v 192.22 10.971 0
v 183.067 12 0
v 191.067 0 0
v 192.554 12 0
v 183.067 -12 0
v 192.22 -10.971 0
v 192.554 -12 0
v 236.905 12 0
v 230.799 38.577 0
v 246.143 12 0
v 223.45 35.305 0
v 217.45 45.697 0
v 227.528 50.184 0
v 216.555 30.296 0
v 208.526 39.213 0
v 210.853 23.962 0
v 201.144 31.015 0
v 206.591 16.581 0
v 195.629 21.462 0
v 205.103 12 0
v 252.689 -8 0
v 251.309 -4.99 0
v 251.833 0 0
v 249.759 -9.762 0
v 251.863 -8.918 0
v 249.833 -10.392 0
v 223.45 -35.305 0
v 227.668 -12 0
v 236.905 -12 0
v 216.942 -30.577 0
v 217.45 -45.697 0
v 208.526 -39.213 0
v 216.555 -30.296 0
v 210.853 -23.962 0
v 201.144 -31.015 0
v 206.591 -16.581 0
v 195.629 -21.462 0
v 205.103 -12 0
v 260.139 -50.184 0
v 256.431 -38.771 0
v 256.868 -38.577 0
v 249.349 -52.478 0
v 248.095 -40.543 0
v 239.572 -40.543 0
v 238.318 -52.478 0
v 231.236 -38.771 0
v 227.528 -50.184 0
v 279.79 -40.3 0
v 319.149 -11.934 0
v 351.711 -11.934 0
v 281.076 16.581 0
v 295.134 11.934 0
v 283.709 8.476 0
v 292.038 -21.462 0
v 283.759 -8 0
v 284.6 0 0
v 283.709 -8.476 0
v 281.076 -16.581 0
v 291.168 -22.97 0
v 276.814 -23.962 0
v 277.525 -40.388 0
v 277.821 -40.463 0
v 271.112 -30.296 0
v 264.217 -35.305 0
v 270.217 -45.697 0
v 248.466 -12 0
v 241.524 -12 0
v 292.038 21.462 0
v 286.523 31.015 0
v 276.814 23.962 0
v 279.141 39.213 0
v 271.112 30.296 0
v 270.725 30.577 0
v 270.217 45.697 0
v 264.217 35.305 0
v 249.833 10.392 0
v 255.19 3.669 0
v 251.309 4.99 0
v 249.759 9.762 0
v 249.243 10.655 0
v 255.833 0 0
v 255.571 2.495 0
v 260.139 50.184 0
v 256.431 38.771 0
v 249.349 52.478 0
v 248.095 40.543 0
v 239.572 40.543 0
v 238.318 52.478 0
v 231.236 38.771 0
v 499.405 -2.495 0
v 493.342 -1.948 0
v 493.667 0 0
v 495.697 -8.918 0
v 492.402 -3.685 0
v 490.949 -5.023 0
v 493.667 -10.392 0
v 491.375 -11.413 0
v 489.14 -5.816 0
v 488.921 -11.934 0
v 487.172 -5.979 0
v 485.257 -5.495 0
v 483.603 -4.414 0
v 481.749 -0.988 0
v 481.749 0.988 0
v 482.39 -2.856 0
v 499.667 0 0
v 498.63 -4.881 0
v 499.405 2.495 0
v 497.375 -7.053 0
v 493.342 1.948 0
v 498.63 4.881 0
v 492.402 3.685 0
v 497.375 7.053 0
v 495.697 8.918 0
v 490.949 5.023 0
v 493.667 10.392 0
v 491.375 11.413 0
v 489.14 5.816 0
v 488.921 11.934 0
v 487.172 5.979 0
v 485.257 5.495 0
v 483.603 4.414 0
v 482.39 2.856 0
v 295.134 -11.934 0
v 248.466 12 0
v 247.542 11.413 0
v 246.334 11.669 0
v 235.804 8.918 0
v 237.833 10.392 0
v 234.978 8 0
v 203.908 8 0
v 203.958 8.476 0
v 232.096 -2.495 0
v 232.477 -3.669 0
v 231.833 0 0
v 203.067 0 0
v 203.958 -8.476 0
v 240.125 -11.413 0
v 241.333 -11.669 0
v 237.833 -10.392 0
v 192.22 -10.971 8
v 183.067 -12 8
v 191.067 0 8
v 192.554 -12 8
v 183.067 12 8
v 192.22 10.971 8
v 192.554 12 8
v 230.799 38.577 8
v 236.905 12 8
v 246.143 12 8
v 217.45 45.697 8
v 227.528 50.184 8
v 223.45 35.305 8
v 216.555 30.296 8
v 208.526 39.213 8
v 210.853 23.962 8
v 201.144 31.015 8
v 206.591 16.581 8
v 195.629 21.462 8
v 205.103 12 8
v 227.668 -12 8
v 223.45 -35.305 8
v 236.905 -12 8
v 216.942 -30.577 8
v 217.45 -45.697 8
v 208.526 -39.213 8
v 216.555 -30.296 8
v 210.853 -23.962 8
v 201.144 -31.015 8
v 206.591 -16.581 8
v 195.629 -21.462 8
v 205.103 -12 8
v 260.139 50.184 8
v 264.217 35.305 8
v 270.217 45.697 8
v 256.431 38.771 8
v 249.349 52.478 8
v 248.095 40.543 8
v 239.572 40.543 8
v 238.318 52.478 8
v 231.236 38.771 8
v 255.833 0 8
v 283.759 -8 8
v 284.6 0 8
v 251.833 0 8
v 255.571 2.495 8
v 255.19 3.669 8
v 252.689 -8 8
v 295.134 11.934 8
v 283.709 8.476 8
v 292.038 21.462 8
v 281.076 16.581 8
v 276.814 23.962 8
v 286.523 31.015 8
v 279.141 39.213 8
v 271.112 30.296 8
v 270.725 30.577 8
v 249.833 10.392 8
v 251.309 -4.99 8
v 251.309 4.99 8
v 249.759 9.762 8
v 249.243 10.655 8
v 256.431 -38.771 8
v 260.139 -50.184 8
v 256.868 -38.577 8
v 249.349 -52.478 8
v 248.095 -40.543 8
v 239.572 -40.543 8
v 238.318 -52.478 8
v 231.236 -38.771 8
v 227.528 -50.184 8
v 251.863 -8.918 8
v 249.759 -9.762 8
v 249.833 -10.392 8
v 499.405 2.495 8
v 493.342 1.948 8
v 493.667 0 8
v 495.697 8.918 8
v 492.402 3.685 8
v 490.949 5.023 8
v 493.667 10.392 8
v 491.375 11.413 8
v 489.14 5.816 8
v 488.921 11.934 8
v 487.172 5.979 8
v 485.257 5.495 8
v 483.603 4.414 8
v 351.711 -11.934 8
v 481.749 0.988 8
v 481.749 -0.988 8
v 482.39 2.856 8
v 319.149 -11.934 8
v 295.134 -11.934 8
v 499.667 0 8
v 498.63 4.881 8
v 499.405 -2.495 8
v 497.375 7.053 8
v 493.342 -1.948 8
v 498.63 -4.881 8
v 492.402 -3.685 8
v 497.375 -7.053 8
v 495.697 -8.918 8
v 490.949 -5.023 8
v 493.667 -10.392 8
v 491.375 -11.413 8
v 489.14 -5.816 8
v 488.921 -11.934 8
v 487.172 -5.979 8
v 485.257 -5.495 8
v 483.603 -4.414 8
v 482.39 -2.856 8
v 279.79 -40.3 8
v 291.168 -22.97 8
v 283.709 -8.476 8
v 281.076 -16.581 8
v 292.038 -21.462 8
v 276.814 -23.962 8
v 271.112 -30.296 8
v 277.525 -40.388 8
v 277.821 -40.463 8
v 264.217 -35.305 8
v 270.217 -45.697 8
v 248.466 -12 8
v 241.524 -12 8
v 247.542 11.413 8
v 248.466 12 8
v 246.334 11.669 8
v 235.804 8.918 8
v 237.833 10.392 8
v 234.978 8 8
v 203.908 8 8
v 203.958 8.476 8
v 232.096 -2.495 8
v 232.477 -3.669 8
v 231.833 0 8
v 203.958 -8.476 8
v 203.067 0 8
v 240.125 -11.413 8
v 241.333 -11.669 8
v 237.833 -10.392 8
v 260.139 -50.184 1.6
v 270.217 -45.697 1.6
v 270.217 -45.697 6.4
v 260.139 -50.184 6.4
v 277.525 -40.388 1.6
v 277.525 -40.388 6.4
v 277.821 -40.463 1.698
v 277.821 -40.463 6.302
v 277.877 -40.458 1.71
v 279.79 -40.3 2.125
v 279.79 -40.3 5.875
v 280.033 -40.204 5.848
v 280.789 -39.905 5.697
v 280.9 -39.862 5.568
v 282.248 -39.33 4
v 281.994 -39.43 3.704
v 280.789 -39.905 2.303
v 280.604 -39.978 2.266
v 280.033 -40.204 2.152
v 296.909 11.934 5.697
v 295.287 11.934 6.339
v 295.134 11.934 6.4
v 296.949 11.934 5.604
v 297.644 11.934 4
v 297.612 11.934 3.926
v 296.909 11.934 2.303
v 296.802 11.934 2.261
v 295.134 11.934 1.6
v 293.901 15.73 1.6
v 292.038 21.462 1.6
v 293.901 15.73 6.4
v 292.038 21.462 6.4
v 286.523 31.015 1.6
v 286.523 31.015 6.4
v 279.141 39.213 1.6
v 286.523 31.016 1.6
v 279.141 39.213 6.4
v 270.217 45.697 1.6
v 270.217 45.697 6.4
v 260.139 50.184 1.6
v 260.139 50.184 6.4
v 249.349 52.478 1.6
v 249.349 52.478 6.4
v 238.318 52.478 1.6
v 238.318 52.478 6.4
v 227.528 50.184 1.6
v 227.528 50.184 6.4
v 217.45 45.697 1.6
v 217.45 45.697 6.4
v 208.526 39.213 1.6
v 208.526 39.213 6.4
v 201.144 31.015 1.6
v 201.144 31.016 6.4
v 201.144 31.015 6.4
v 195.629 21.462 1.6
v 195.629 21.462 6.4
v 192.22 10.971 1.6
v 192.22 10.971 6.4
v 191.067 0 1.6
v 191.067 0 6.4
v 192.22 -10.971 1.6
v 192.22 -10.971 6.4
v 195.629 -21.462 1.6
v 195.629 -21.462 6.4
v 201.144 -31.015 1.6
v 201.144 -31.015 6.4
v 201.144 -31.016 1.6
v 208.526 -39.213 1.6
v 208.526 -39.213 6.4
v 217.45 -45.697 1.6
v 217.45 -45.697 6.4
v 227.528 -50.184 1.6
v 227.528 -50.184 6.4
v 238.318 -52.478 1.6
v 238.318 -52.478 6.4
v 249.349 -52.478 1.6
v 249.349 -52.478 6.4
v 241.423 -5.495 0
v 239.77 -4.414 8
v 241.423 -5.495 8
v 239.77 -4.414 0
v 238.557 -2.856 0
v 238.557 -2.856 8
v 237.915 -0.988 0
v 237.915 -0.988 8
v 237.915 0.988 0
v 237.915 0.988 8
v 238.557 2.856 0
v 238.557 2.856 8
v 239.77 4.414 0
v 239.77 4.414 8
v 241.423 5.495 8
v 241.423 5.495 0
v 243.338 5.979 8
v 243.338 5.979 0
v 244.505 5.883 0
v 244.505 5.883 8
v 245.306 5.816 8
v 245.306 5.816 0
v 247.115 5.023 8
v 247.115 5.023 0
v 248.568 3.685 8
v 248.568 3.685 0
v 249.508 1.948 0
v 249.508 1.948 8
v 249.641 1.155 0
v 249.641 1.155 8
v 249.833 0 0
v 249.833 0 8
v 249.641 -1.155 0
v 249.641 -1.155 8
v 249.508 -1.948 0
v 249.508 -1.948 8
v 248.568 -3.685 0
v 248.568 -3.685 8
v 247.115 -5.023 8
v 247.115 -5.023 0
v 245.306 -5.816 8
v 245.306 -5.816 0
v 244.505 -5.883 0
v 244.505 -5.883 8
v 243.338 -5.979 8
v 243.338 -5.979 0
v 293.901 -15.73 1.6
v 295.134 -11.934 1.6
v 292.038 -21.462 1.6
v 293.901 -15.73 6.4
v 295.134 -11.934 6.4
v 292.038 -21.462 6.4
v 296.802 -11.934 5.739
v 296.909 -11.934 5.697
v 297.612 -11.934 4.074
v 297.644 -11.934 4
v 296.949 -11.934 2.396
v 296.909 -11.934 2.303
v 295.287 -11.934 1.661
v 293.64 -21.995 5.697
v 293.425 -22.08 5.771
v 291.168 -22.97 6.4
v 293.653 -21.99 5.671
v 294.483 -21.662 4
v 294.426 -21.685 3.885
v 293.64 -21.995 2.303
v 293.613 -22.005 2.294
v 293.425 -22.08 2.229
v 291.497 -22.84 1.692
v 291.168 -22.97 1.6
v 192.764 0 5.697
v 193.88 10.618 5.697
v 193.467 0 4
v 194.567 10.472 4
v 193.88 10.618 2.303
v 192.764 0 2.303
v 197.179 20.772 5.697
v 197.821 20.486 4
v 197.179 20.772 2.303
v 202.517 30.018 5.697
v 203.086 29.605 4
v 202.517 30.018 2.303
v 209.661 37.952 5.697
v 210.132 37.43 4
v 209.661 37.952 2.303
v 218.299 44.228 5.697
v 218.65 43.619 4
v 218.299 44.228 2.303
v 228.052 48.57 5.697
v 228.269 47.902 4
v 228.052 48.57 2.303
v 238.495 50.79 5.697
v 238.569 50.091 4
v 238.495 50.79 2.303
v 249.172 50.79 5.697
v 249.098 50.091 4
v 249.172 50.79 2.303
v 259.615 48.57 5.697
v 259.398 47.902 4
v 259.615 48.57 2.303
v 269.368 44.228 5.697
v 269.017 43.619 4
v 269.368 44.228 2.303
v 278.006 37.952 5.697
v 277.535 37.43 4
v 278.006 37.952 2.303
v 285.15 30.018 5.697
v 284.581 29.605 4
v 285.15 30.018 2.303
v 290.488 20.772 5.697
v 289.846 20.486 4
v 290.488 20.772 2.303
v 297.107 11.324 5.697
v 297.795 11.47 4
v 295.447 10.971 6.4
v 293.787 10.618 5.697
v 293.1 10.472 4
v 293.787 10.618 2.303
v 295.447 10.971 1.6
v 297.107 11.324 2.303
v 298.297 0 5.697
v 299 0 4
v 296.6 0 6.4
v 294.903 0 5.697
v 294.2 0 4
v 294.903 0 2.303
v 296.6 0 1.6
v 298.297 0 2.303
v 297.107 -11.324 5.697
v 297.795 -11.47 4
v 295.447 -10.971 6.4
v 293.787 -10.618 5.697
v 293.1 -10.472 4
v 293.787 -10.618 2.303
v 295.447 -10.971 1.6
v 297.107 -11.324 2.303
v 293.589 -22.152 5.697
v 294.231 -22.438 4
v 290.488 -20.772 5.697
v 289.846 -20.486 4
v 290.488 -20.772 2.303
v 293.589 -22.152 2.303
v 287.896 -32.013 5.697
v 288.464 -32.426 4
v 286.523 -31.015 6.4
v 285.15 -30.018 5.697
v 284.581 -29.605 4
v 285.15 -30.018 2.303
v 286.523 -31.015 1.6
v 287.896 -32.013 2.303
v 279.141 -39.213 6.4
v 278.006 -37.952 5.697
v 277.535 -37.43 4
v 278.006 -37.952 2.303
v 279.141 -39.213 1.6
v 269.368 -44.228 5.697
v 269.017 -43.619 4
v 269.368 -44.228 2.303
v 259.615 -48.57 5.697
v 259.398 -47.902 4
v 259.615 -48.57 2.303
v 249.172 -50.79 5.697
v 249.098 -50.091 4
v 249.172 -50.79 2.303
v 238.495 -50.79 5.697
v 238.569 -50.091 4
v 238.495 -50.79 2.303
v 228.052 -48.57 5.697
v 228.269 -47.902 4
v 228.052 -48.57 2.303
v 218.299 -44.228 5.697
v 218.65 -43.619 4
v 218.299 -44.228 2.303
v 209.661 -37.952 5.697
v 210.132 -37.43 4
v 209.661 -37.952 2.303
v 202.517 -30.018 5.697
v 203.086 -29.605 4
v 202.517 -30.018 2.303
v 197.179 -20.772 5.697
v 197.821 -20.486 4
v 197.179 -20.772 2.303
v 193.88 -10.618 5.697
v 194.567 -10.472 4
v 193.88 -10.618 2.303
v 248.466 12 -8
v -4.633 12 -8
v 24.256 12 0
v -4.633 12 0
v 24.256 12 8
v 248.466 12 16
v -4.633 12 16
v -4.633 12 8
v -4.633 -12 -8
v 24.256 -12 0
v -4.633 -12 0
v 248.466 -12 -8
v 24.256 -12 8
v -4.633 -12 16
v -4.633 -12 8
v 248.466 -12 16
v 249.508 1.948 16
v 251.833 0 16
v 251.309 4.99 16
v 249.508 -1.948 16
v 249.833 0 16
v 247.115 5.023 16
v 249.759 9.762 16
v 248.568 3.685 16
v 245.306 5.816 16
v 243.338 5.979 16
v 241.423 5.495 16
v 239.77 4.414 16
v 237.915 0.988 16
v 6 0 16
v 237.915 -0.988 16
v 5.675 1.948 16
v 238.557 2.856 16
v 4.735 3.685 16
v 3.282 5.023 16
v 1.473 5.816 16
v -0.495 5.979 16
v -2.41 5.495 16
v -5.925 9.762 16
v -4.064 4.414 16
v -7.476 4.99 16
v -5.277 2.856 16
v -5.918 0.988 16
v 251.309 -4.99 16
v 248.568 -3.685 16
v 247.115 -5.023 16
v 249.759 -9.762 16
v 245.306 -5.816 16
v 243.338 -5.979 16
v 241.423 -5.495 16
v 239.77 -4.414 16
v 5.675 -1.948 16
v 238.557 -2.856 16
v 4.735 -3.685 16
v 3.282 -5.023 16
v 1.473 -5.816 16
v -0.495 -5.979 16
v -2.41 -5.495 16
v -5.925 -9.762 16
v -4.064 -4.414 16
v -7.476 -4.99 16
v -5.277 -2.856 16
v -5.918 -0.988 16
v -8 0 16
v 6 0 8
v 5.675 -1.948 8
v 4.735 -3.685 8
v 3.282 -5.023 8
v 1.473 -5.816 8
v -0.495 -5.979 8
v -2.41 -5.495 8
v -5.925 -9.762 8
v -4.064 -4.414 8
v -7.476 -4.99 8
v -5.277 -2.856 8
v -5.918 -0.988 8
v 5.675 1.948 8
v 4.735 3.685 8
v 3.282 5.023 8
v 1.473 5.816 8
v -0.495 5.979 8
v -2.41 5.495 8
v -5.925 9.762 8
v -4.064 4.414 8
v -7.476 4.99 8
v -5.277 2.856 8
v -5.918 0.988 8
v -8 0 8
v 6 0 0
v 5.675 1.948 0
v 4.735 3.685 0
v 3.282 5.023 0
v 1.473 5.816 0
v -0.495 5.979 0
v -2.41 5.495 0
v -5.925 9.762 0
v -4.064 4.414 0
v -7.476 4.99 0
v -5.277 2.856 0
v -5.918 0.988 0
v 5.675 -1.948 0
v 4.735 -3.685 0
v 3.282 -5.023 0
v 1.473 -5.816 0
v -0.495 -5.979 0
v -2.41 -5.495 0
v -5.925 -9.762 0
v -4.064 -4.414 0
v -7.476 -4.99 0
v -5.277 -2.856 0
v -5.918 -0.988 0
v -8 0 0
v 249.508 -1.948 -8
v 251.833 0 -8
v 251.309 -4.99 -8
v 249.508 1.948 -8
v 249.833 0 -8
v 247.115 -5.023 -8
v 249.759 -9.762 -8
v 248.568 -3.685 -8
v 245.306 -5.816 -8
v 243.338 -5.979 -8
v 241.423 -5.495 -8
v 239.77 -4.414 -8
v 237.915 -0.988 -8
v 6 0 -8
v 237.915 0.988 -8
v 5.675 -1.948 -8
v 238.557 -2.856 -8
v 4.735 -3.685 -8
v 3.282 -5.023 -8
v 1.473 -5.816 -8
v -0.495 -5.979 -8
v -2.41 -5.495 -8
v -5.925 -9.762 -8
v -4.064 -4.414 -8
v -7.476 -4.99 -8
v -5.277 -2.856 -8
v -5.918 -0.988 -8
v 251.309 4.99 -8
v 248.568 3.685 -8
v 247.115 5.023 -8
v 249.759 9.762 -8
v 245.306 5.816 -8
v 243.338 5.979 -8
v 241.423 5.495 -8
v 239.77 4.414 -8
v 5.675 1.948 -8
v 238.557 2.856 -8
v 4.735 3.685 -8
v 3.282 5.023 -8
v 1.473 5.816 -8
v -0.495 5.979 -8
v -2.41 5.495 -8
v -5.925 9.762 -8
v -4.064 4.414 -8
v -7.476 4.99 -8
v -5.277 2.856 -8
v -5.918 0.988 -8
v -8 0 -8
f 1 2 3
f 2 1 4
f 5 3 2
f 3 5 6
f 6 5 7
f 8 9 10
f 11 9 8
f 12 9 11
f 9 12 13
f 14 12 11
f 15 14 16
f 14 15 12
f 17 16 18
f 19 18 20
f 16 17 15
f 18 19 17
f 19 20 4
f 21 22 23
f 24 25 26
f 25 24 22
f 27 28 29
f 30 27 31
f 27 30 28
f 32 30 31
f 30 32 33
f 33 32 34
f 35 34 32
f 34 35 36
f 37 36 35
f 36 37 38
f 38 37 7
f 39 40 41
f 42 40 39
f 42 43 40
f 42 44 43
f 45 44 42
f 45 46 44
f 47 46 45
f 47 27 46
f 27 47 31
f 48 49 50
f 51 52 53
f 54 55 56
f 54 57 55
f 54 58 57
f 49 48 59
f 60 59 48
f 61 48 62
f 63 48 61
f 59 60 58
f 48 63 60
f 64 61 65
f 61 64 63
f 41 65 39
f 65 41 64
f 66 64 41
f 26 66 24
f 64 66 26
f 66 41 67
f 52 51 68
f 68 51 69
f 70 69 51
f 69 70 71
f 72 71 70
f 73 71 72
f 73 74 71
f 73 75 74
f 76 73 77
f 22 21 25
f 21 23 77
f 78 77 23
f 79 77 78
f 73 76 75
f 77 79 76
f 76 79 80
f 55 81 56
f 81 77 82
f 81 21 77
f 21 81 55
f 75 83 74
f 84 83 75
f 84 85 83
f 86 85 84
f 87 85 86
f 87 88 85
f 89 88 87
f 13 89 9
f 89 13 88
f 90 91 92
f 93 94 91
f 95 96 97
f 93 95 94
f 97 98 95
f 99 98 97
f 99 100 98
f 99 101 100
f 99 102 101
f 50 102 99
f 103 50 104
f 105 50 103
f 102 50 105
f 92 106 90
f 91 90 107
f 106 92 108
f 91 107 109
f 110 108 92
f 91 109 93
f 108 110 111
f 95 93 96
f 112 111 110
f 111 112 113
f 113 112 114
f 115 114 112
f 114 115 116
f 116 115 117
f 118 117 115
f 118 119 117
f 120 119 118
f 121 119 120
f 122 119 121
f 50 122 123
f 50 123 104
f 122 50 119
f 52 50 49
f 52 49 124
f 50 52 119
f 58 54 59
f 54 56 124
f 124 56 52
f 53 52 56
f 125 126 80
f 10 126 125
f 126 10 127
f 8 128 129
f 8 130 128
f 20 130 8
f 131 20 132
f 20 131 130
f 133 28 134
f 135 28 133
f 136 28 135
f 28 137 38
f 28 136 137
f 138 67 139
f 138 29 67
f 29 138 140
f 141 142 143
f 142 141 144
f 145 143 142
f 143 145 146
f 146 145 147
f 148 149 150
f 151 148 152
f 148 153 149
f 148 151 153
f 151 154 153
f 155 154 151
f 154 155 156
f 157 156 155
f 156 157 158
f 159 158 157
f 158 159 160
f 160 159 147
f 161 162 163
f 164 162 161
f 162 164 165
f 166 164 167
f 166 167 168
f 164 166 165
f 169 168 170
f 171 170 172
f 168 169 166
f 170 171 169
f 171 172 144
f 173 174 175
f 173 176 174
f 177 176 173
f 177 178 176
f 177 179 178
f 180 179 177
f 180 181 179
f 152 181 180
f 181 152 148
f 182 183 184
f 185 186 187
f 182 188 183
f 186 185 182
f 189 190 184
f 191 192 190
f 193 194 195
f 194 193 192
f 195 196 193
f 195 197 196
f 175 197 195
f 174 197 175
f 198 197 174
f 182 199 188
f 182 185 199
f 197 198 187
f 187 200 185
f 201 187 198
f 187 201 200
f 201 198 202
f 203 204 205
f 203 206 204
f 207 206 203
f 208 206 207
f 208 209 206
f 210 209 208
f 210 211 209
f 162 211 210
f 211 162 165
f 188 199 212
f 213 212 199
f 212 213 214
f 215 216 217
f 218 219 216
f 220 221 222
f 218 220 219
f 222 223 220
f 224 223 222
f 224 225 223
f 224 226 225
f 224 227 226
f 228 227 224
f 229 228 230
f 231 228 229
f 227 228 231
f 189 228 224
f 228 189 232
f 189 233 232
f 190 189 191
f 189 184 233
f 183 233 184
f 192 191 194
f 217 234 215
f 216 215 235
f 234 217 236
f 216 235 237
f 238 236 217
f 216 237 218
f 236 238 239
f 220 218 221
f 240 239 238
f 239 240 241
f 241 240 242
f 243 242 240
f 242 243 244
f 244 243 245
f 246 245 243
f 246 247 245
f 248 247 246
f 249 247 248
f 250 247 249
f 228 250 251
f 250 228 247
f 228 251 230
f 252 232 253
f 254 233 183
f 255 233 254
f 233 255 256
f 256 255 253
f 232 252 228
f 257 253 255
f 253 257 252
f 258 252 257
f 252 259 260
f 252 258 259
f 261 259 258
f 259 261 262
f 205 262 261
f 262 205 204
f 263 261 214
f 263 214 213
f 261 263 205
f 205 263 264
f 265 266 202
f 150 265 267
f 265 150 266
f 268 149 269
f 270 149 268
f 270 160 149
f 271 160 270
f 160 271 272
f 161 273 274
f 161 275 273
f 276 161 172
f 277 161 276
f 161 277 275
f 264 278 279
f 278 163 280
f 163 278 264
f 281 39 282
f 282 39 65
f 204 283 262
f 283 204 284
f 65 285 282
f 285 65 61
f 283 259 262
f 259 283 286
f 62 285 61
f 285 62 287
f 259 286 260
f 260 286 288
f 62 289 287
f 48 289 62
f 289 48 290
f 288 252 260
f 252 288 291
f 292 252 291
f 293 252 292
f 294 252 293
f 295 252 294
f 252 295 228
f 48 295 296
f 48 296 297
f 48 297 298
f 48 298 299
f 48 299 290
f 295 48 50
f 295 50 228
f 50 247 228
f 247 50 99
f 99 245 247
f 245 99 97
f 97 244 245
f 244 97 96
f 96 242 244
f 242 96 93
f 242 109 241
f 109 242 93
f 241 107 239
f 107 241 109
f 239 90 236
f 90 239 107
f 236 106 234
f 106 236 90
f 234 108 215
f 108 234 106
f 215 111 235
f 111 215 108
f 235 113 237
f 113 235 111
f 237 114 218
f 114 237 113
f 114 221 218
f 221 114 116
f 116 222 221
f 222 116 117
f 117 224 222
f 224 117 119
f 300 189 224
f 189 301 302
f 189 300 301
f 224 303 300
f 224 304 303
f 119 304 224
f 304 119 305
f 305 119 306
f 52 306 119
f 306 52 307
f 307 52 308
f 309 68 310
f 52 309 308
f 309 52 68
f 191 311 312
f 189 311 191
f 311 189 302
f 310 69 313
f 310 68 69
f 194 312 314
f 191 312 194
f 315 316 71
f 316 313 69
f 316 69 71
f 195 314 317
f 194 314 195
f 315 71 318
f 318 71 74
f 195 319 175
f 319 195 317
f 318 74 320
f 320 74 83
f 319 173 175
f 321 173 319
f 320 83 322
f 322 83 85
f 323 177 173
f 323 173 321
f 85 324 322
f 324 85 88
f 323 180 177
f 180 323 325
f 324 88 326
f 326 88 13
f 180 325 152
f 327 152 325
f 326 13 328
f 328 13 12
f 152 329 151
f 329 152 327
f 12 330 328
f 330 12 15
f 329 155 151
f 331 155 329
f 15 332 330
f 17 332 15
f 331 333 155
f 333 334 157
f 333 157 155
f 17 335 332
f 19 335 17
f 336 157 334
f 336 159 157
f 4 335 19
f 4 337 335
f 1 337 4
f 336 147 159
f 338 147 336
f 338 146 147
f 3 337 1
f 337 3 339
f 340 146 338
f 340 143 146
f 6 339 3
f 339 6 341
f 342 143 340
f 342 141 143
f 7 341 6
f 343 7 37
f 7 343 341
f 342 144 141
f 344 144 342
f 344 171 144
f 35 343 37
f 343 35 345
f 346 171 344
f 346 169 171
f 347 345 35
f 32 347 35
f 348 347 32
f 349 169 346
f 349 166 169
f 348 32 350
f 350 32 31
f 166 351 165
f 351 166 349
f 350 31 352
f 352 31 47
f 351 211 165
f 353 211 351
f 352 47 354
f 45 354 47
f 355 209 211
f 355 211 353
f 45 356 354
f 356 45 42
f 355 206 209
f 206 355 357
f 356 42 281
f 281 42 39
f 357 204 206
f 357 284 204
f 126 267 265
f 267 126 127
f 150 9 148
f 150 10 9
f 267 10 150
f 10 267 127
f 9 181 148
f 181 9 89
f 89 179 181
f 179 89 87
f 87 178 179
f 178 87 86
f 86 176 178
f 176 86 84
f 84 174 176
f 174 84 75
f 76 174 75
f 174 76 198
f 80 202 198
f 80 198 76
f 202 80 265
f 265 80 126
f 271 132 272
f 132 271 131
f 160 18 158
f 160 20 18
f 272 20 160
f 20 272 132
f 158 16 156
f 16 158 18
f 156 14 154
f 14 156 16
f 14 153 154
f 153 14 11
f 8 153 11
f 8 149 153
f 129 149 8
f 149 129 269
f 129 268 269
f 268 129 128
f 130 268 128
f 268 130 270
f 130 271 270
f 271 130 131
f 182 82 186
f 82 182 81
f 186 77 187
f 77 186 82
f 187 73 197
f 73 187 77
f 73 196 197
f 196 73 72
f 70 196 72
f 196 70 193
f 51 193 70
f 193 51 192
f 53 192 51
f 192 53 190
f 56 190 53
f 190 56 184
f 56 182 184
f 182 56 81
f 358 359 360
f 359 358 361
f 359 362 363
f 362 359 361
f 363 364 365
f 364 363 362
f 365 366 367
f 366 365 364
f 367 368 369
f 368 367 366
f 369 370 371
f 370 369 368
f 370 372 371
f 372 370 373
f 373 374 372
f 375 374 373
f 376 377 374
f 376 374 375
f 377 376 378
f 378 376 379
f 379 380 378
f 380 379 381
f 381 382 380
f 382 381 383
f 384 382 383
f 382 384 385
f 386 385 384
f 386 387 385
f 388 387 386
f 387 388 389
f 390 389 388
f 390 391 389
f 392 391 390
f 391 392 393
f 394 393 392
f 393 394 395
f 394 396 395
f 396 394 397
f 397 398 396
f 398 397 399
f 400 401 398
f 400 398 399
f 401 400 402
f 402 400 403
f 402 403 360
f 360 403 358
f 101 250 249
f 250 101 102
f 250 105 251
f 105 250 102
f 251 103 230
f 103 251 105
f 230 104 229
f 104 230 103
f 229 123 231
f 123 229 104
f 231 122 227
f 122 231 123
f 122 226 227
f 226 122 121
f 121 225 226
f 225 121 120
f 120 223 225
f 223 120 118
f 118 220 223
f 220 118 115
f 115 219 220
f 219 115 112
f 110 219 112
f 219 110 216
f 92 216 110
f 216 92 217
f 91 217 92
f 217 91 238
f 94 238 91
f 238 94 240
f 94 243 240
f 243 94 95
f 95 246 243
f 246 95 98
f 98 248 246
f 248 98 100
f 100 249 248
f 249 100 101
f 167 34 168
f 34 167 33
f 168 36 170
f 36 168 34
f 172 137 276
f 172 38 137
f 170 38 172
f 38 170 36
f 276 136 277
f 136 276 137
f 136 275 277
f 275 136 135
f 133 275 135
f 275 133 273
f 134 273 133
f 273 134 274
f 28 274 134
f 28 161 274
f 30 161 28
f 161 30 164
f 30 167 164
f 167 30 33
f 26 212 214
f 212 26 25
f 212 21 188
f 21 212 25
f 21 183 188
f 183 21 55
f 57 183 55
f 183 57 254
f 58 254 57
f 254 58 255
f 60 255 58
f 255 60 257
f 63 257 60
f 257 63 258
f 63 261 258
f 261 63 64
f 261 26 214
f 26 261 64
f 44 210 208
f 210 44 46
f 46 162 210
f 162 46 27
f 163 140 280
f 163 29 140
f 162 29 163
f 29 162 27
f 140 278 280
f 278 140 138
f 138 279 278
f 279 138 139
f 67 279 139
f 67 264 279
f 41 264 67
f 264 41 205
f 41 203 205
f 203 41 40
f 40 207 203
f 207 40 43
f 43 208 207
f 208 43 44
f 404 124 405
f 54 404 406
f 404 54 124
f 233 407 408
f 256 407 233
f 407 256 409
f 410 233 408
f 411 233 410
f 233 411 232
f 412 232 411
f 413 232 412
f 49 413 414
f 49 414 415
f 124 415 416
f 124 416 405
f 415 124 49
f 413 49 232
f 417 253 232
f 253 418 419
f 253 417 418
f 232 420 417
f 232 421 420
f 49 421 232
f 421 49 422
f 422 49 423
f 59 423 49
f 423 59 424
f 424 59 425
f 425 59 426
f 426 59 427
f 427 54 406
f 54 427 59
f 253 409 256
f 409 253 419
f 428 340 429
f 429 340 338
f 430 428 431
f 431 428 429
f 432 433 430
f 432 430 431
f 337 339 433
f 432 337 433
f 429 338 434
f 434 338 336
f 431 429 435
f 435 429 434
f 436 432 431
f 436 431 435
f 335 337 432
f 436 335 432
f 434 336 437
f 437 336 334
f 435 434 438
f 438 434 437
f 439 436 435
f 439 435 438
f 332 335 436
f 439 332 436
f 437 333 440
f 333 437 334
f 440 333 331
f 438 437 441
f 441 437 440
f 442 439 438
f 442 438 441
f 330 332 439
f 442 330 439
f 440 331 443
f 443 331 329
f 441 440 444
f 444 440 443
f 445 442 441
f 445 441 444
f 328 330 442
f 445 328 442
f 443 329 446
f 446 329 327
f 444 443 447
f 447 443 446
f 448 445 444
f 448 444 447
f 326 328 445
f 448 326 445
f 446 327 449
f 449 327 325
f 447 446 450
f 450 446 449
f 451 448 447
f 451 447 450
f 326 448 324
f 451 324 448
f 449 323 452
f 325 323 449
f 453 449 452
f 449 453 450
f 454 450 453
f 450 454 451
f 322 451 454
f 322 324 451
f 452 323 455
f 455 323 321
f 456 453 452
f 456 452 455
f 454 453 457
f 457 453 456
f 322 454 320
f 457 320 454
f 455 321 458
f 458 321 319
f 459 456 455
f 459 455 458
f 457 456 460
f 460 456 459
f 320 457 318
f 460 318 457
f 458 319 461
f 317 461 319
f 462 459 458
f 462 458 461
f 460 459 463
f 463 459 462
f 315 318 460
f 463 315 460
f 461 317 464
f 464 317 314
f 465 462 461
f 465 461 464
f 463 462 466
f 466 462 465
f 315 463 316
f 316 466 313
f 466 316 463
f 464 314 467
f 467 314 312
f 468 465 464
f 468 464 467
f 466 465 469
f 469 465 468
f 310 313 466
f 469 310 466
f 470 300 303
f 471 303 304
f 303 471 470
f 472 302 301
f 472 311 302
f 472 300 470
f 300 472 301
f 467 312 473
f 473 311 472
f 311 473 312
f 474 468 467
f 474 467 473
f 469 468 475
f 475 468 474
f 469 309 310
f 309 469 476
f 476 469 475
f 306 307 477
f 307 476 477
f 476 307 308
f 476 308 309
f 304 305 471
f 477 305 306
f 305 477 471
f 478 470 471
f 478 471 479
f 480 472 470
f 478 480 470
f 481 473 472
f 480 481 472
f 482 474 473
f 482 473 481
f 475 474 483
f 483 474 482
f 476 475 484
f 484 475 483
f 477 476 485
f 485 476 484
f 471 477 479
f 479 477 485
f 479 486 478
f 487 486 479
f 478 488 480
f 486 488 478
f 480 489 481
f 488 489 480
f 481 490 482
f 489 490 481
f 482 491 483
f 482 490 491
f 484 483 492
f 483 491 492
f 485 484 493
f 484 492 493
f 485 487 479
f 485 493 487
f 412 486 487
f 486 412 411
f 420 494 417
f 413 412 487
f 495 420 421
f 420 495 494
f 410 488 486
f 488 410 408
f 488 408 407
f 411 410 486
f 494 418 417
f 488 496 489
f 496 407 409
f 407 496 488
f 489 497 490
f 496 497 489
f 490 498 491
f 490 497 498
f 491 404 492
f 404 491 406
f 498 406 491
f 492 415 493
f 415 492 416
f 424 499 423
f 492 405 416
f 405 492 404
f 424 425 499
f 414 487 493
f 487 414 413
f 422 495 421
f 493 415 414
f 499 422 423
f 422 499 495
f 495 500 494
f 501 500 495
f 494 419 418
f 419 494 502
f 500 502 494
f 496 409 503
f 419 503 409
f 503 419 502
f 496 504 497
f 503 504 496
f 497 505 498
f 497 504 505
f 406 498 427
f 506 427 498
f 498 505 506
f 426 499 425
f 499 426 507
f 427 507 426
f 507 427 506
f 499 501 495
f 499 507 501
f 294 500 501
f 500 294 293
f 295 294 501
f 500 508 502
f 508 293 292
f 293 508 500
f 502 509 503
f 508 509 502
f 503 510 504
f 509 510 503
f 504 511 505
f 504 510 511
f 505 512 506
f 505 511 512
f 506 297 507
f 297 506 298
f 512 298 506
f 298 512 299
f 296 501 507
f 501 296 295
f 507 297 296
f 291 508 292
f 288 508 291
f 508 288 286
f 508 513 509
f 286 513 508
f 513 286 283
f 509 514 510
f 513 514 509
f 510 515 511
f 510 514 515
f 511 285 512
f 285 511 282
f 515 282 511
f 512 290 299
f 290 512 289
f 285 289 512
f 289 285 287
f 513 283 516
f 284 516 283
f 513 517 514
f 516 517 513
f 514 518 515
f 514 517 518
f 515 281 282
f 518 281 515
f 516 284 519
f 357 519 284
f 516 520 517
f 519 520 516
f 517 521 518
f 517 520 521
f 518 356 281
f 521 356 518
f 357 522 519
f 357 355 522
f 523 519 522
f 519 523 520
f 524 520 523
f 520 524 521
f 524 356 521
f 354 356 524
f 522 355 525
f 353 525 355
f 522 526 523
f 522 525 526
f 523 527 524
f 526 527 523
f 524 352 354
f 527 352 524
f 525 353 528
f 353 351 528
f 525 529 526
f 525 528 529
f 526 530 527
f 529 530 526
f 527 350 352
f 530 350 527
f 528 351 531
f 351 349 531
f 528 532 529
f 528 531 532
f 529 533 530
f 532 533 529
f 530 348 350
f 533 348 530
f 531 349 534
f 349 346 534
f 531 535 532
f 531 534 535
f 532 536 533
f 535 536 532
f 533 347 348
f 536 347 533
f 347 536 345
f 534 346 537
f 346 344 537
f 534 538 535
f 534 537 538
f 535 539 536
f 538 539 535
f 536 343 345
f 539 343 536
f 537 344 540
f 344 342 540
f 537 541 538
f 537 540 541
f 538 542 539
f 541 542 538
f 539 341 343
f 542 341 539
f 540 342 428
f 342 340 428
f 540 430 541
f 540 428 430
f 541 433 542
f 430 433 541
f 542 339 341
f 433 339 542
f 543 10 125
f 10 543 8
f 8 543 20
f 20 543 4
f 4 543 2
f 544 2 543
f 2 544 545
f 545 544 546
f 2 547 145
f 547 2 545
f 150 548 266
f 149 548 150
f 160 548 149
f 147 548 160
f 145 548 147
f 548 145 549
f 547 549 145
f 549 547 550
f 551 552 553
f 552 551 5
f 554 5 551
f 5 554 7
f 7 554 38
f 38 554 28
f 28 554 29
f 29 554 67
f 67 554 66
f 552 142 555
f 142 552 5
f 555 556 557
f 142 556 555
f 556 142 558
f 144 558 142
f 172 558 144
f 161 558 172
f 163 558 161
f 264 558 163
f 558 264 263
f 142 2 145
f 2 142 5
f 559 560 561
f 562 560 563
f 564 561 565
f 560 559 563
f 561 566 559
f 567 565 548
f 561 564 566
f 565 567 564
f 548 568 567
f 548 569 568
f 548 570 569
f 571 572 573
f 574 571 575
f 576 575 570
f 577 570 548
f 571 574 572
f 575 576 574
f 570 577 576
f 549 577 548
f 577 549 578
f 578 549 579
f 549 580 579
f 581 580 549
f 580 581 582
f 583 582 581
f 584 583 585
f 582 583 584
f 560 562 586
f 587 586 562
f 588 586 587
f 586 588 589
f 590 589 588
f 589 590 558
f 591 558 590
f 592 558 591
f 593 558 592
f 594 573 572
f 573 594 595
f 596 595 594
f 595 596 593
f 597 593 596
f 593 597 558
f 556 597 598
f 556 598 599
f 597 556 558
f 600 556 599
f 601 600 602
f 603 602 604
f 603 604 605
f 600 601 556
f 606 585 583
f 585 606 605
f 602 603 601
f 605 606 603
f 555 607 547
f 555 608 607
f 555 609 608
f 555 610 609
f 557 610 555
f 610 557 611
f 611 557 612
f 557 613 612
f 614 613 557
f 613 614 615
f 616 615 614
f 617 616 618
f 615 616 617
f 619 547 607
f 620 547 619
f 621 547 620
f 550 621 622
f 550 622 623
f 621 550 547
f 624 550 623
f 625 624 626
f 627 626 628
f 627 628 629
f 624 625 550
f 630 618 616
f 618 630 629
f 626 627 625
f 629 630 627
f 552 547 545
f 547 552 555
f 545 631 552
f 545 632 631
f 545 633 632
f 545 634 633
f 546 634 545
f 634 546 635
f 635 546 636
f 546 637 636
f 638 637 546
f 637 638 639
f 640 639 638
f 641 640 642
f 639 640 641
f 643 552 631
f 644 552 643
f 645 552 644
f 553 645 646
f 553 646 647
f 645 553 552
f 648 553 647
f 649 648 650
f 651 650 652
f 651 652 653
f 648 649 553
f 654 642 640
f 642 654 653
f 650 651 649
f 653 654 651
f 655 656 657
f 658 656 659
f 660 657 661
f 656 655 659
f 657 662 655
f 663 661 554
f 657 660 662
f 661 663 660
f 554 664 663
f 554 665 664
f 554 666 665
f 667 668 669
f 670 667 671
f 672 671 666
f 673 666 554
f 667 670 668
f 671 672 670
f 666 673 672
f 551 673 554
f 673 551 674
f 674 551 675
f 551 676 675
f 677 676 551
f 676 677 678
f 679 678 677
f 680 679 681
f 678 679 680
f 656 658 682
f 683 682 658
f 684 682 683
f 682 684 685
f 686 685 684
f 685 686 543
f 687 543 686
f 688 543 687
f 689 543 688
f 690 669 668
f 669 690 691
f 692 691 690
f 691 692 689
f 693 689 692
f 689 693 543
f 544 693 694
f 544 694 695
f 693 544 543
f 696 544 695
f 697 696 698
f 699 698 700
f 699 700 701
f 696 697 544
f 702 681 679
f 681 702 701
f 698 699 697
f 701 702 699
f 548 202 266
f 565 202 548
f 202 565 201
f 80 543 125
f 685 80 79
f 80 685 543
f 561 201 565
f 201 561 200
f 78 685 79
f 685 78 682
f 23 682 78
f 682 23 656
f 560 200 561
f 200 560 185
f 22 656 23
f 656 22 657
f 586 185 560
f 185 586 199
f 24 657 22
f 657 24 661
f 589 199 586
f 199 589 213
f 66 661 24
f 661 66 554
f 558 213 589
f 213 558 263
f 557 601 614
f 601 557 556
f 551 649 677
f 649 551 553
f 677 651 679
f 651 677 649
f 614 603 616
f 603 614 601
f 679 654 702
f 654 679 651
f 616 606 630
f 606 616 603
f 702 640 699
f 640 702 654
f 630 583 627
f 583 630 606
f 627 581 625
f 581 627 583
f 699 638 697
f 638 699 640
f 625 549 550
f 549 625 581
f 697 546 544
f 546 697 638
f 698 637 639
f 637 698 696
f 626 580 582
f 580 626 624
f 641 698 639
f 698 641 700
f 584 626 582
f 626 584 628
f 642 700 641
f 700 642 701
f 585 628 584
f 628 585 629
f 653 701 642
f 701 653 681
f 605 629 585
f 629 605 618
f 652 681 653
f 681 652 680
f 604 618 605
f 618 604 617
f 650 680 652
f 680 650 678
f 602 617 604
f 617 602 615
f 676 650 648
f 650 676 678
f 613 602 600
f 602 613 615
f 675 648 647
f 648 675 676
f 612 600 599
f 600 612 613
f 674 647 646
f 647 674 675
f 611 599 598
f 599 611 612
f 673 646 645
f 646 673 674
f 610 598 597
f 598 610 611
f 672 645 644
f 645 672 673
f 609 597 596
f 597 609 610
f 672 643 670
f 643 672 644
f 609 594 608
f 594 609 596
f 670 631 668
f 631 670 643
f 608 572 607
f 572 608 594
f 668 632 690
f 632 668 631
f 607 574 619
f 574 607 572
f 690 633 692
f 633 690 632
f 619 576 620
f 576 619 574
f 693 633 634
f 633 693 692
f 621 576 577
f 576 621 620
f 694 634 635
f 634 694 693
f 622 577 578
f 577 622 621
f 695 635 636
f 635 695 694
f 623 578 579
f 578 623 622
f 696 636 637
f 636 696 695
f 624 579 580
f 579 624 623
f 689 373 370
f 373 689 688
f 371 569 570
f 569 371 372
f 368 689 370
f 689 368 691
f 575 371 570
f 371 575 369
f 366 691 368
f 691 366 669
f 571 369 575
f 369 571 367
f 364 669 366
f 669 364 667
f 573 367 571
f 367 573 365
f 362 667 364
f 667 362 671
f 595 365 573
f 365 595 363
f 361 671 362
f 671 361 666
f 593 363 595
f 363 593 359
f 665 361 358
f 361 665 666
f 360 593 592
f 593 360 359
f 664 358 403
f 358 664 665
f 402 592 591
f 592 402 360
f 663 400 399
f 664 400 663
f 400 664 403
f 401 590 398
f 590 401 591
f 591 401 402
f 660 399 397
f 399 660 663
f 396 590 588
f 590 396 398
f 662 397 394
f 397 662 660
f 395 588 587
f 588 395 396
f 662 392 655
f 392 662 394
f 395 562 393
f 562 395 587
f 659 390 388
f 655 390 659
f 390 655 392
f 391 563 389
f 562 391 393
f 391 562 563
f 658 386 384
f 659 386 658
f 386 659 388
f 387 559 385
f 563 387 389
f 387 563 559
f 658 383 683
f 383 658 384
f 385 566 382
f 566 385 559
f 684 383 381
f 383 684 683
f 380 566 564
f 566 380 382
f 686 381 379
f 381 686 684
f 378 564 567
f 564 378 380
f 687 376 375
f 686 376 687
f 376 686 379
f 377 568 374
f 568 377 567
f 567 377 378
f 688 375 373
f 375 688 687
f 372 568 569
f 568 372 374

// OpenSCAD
// file: params.scad
t=4;
pt=10; //Plate thickness.

bh=20; //Bed height.
bw=200;

bbr=4;//5; //Smooth rod radius.
sbr=3;

zrd= pt+bbr+2*t; //Z rod distance.
dc=bbr/sqrt(2)+3*t; //Distance of bed corners to rods.

w=bw+2*pt+2*zrd; 
l=w; 
fh=40; //Front height.

bzd=min(bw/3, 100-bbr-t);

bt=1.5*t; //Bottom thickness of corners.


sr=2; //Screw radius.

rod_adjustable=false;

aw=2*t;

min_a=20;
max_a=70;

ad=(w-sqrt(2)*zrd)/cos(min_a)-t;
ah=3*aw;
aR=ad/5;
ar=aR/3;

adx= zrd+2*bbr+t;// w/2-pt-t-ah/2-2*bbr-t; //Distance from corners of thingy.

function bed_z(a) = ah/2-t + 2*ad*sin(a)-(fh-aw-3*t);

max_z=bed_z(max_a);
min_z=bed_z(min_a);

h=max_z+2*fh+2*bh; //Sizes.
// main file
//
//  Copyright (C) 08-01-2014 Jasper den Ouden.(ojasper.nl)
//
//  This is free software: you can redistribute it and/or modify
//  it under the terms of the GNU General Public License as published
//  by the Free Software Foundation, either version 3 of the License, or
//  (at your option) any later version.
//

include<params.scad>

module bottom_arm2d(aR=aR+t)
{
    difference()
    {   translate([-aw,-aw]) square([ad+2*aw,3*aw]);
        translate([ad-aR-aw,0]) square([8*aR,aw]);
        translate([-ad,0]) square([ad+ar+aw,aw]);
    }
}

module bottom_arm()
{
    rotate([90,0,0]) intersection()
    {   linear_extrude(height=ah) bottom_arm2d();
        translate([0,4*aw,ah/2]) rotate([90,0,0]) linear_extrude(height=8*aw) difference()
        {   hull()
            {   translate([ah-aw,0]) circle(ah);
                translate([ad+aw-ah,0]) circle(ah);
            }
            circle(ah/4);
            translate([ad,0]) circle(ah/4);
        }
    }
}

module top_arm2d() //Profiled from other direction than the other one!
{
    n=6;
    difference()
    {   union()
        {   circle(aR+t);
            hull(){ circle(ah/2); translate([ad,0]) circle(ah/2); }
            hull(){ translate(aR*[1,-1]/sqrt(2)) circle(ah/4); 
                    translate([ad/2,0]) circle(ah/4); }
         }
        circle(ah/4);
        translate([ad,0]) circle(ah/4);
        difference() //Get it some spokes.
        {   circle(aR-aw);
            circle(ah/2);
            for(a=[0:360/n:360*(1-1/n)]) rotate(30+a) square([aw,aR]);
        }
    }
}
module top_arm()
{   difference()
    {   linear_extrude(height=aw) top_arm2d(); 
        rotate_extrude() translate([aR+t,aw/2]) circle(0.6*t); //Groove.
    }
}

translate([ad,0]) rotate(140*$t) top_arm();
translate([0,ah/2]) color("red") bottom_arm();
